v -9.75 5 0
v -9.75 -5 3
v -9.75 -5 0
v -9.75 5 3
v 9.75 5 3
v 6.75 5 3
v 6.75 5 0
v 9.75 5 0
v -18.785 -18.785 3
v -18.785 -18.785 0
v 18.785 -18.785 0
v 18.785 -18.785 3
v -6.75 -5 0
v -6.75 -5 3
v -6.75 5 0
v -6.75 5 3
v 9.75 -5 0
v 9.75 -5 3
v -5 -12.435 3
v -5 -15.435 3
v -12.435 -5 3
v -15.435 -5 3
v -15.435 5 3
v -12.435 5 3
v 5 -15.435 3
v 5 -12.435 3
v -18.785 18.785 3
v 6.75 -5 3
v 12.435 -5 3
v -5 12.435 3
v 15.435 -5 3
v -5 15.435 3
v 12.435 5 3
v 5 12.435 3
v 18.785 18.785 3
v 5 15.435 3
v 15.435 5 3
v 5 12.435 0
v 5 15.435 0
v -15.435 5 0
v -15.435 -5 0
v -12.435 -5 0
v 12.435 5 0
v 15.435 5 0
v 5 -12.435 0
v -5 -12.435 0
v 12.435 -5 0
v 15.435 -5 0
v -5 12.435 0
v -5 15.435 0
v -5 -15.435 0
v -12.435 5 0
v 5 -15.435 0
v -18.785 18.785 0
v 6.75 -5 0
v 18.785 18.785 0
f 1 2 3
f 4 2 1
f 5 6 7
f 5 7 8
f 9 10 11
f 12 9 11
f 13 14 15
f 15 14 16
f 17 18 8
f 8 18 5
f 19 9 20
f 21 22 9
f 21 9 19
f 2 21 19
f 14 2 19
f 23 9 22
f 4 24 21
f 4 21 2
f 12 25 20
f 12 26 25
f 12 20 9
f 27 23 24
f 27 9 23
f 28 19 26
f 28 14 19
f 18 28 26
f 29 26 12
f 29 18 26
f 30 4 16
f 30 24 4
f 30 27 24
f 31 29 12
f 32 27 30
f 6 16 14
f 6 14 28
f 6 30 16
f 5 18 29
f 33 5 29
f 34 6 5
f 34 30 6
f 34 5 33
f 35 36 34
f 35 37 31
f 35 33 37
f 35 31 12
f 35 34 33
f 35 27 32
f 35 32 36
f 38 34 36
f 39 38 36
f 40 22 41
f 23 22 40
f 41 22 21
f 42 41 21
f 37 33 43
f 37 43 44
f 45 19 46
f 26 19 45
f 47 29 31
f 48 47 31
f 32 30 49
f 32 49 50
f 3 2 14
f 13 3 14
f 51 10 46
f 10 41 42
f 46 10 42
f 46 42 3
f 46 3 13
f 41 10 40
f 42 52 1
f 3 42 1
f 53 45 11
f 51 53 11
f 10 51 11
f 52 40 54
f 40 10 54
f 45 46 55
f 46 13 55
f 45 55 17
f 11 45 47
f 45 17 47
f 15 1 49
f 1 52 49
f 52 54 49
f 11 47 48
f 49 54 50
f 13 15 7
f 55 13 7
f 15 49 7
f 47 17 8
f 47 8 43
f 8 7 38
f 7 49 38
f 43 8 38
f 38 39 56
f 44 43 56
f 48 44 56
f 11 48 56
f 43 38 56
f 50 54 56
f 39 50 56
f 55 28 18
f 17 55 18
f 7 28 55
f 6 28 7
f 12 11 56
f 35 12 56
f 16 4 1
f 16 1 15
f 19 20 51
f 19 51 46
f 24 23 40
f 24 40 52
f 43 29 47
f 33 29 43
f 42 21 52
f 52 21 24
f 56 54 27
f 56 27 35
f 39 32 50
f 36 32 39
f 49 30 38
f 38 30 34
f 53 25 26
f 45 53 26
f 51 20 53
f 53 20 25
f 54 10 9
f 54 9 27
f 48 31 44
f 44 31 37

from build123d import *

# Parameters (mm, degrees)
SKETCH1_W                 = 37.57
SKETCH1_H                 = 37.57
SKETCH1_W_2               = 3
SKETCH1_H_2               = 3
SKETCH1_H_3               = 5
PLATE_THICKNESS_3MM_DEPTH = 3
SKETCH_1_W                = 3
SKETCH_1_H                = 0.35
SKETCH_1_W_2              = 0.35
SKETCH_1_H_2              = 3.026917622
SKETCH_1_H_3              = 3
CUT_EXTRUDE_1_DEPTH       = 3
SKETCH_1_2_W              = 0.35
SKETCH_1_2_H              = 3
SKETCH_1_2_W_2            = 3
SKETCH_1_2_H_2            = 0.35
EXTRUDE_1_DEPTH           = 3
SKETCH_2_W                = 3
SKETCH_2_H                = 3.5
SKETCH_2_H_2              = 2.5
SKETCH_2_W_2              = 3.5
SKETCH_2_H_3              = 3
CUT_EXTRUDE_2_DEPTH       = 3


with BuildPart() as part:
    # Sketch1 → Plate_thickness_3mm (new body)
    with BuildSketch(Plane.XY):
        Rectangle(SKETCH1_W, SKETCH1_H)
        with Locations((0, -14.285)):
            Rectangle(SKETCH1_W_2, SKETCH1_H_2, mode=Mode.SUBTRACT)
        with Locations((14.285, 0)):
            Rectangle(SKETCH1_W_2, SKETCH1_H_2, mode=Mode.SUBTRACT)
        with Locations((-14.285, 0)):
            Rectangle(SKETCH1_W_2, SKETCH1_H_2, mode=Mode.SUBTRACT)
        with Locations((-8.25, 0)):
            Rectangle(SKETCH1_W_2, SKETCH1_H_3, mode=Mode.SUBTRACT)
        with Locations((0, 14.285)):
            Rectangle(SKETCH1_W_2, SKETCH1_H_2, mode=Mode.SUBTRACT)
        with Locations((8.25, 0)):
            Rectangle(SKETCH1_W_2, SKETCH1_H_3, mode=Mode.SUBTRACT)
    extrude(amount=PLATE_THICKNESS_3MM_DEPTH)

    # 草图1 → 切除-拉伸1 (cut)
    with BuildSketch(Plane.XY.offset(3)):
        with Locations((0, 12.61)):
            Rectangle(SKETCH_1_W, SKETCH_1_H)
        with Locations((-12.61, -0.013458811)):
            Rectangle(SKETCH_1_W_2, SKETCH_1_H_2)
        with Locations((12.61, -0.013458811)):
            Rectangle(SKETCH_1_W_2, SKETCH_1_H_2)
        with Locations((0, -12.61)):
            Rectangle(SKETCH_1_W, SKETCH_1_H)
        with Locations((-15.61, 0)):
            Rectangle(SKETCH_1_W_2, SKETCH_1_H_3)
        with Locations((0, 15.61)):
            Rectangle(SKETCH_1_W, SKETCH_1_H)
        with Locations((15.61, 0)):
            Rectangle(SKETCH_1_W_2, SKETCH_1_H_3)
        with Locations((0, -15.61)):
            Rectangle(SKETCH_1_W, SKETCH_1_H)
    extrude(amount=-CUT_EXTRUDE_1_DEPTH, mode=Mode.SUBTRACT)

    # 草图1<2> → 凸台-拉伸1 (add)
    with BuildSketch(Plane.XY.offset(3)):
        with Locations((-15.61, 0)):
            Rectangle(SKETCH_1_2_W, SKETCH_1_2_H)
        with Locations((0, 15.61)):
            Rectangle(SKETCH_1_2_W_2, SKETCH_1_2_H_2)
        with Locations((15.61, 0)):
            Rectangle(SKETCH_1_2_W, SKETCH_1_2_H)
        with Locations((0, -15.61)):
            Rectangle(SKETCH_1_2_W_2, SKETCH_1_2_H_2)
    extrude(amount=-EXTRUDE_1_DEPTH)

    # 草图2 → 切除-拉伸2 (cut)
    with BuildSketch(Plane.XY.offset(3)):
        with Locations((-13.935, 3.25)):
            Rectangle(SKETCH_2_W, SKETCH_2_H)
        with Locations((-8.25, 3.75)):
            Rectangle(SKETCH_2_W, SKETCH_2_H_2)
        with Locations((-8.25, -3.75)):
            Rectangle(SKETCH_2_W, SKETCH_2_H_2)
        Polygon((-12.785, -1.5), (-15.435, -1.5), (-15.435, -5), (-12.435, -5), (-12.435, -1.526917622), (-12.785, -1.526917622), align=None)
        with Locations((-3.25, 13.935)):
            Rectangle(SKETCH_2_W_2, SKETCH_2_H_3)
        with Locations((3.25, 13.935)):
            Rectangle(SKETCH_2_W_2, SKETCH_2_H_3)
        with Locations((8.25, 3.75)):
            Rectangle(SKETCH_2_W, SKETCH_2_H_2)
        with Locations((13.935, 3.25)):
            Rectangle(SKETCH_2_W, SKETCH_2_H)
        Polygon((12.785, -1.526917622), (12.435, -1.526917622), (12.435, -5), (15.435, -5), (15.435, -1.5), (12.785, -1.5), align=None)
        with Locations((8.25, -3.75)):
            Rectangle(SKETCH_2_W, SKETCH_2_H_2)
        with Locations((3.25, -13.935)):
            Rectangle(SKETCH_2_W_2, SKETCH_2_H_3)
        with Locations((-3.25, -13.935)):
            Rectangle(SKETCH_2_W_2, SKETCH_2_H_3)
    extrude(amount=-CUT_EXTRUDE_2_DEPTH, mode=Mode.SUBTRACT)


solid = part.part
